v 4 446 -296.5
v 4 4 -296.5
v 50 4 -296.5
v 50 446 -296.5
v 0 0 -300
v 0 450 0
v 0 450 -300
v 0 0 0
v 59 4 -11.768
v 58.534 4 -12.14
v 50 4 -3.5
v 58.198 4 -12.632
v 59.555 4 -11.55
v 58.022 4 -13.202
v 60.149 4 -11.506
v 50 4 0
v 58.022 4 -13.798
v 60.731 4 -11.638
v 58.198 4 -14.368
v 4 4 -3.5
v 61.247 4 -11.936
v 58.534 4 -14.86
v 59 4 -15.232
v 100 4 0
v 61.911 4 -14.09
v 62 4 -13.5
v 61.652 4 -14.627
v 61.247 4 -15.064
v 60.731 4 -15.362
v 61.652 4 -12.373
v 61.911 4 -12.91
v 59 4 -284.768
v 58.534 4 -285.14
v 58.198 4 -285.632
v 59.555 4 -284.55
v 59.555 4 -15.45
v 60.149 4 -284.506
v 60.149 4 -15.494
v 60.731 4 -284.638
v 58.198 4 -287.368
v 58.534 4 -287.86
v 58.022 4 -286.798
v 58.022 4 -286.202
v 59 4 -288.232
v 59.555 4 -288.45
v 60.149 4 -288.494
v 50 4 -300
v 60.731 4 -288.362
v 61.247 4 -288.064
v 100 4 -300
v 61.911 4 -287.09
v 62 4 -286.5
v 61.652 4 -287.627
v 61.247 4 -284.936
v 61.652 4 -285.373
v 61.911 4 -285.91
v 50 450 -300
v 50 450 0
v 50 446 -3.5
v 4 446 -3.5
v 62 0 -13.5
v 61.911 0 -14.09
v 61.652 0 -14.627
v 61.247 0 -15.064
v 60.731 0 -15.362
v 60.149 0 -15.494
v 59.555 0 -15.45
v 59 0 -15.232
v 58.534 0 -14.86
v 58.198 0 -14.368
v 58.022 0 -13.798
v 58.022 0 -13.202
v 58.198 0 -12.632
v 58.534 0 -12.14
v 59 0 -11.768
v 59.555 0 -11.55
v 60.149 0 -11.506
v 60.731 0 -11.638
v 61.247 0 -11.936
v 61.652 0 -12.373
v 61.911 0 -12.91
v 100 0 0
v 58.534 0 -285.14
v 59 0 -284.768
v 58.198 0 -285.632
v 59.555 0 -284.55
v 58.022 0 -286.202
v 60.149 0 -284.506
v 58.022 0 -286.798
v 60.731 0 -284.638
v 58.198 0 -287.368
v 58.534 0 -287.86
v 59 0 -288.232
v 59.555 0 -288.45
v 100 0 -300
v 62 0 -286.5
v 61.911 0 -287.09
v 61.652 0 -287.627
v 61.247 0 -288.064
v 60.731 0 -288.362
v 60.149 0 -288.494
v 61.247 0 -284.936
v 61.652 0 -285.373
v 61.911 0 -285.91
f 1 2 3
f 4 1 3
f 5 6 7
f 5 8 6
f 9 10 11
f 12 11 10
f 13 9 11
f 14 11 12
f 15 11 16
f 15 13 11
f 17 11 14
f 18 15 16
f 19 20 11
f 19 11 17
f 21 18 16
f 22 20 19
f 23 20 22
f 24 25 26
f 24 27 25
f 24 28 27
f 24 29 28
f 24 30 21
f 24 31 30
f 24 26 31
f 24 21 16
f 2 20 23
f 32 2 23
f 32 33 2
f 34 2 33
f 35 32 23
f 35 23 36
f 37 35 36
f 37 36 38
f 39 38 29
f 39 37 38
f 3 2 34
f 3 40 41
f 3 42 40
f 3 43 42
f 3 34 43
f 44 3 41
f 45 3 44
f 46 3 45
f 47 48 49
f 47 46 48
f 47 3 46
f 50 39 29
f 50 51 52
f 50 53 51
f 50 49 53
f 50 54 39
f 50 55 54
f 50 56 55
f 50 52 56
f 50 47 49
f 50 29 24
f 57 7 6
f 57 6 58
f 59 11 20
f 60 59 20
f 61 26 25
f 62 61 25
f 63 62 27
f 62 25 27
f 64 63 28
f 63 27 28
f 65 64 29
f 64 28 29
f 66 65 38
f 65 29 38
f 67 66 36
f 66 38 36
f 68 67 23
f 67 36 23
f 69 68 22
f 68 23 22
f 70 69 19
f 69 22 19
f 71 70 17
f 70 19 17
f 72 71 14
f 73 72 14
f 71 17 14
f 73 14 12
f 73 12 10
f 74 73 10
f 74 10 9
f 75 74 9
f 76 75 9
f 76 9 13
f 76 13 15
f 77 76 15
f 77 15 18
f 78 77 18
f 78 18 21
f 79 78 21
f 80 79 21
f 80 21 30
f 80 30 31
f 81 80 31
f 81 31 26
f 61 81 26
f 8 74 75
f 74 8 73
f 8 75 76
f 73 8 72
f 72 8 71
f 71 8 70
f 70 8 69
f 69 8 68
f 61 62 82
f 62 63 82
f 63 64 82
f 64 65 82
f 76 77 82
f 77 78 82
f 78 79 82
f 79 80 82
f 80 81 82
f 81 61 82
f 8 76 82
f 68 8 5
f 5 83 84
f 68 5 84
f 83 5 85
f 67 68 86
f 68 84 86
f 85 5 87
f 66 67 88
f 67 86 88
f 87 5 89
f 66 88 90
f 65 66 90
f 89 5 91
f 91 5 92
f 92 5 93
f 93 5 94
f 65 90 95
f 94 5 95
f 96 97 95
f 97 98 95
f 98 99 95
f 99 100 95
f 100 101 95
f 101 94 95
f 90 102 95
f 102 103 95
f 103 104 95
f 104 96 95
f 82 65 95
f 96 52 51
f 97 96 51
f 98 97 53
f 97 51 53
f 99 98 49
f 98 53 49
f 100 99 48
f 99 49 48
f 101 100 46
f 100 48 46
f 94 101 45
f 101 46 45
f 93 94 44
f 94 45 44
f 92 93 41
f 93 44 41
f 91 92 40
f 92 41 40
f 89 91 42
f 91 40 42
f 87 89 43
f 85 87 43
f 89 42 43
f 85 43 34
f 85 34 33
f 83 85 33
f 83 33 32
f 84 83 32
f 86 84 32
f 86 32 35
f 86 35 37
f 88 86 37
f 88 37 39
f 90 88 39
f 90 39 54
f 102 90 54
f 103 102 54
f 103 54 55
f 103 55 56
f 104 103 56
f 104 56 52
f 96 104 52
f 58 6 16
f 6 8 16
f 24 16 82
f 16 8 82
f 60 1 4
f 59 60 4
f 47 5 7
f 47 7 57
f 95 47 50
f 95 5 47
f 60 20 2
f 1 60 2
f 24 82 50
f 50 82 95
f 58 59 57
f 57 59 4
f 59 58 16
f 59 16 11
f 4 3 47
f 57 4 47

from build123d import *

# Parameters (mm, degrees)
SKETCH_1_W            = 100
SKETCH_1_H            = 300
EXTRUDE_1_DEPTH       = 4
EXTRUDE_2_DEPTH       = 442
SKETCH_3_W            = 50
SKETCH_3_H            = 300
EXTRUDE_3_DEPTH       = 4
HOLE_WIZARD_4_0_4_1_D = 4


with BuildPart() as part:
    # 草图1 → 凸台-拉伸1 (new body)
    with BuildSketch(Plane(origin=(0, 0, 0), x_dir=(1, 0, 0), z_dir=(0, 1, 0))):
        with Locations((50, 150)):
            Rectangle(SKETCH_1_W, SKETCH_1_H)
    extrude(amount=EXTRUDE_1_DEPTH)

    # 草图2 → 凸台-拉伸2 (add)
    with BuildSketch(Plane(origin=(0, 4, 0), x_dir=(1, 0, 0), z_dir=(0, 1, 0))):
        Polygon((0, 0), (8.236039078, 0), (50, 0), (50, 3.5), (4, 3.5), (4, 296.5), (50, 296.5), (50, 300), (8.236039078, 300), (0, 300), align=None)
    extrude(amount=EXTRUDE_2_DEPTH)

    # 草图3 → 凸台-拉伸3 (add)
    with BuildSketch(Plane(origin=(0, 446, 0), x_dir=(1, 0, 0), z_dir=(0, 1, 0))):
        with Locations((25, 150)):
            Rectangle(SKETCH_3_W, SKETCH_3_H)
    extrude(amount=EXTRUDE_3_DEPTH)

    # Ø4.0 (4) 直径孔1 (through all)
    with Locations(Plane(origin=(0, 0, 0), x_dir=(-1, 0, 0), z_dir=(0, -1, 0))):
        with Locations((-60, 13.5), (-60, 286.5)):
            Hole(HOLE_WIZARD_4_0_4_1_D / 2)


solid = part.part
